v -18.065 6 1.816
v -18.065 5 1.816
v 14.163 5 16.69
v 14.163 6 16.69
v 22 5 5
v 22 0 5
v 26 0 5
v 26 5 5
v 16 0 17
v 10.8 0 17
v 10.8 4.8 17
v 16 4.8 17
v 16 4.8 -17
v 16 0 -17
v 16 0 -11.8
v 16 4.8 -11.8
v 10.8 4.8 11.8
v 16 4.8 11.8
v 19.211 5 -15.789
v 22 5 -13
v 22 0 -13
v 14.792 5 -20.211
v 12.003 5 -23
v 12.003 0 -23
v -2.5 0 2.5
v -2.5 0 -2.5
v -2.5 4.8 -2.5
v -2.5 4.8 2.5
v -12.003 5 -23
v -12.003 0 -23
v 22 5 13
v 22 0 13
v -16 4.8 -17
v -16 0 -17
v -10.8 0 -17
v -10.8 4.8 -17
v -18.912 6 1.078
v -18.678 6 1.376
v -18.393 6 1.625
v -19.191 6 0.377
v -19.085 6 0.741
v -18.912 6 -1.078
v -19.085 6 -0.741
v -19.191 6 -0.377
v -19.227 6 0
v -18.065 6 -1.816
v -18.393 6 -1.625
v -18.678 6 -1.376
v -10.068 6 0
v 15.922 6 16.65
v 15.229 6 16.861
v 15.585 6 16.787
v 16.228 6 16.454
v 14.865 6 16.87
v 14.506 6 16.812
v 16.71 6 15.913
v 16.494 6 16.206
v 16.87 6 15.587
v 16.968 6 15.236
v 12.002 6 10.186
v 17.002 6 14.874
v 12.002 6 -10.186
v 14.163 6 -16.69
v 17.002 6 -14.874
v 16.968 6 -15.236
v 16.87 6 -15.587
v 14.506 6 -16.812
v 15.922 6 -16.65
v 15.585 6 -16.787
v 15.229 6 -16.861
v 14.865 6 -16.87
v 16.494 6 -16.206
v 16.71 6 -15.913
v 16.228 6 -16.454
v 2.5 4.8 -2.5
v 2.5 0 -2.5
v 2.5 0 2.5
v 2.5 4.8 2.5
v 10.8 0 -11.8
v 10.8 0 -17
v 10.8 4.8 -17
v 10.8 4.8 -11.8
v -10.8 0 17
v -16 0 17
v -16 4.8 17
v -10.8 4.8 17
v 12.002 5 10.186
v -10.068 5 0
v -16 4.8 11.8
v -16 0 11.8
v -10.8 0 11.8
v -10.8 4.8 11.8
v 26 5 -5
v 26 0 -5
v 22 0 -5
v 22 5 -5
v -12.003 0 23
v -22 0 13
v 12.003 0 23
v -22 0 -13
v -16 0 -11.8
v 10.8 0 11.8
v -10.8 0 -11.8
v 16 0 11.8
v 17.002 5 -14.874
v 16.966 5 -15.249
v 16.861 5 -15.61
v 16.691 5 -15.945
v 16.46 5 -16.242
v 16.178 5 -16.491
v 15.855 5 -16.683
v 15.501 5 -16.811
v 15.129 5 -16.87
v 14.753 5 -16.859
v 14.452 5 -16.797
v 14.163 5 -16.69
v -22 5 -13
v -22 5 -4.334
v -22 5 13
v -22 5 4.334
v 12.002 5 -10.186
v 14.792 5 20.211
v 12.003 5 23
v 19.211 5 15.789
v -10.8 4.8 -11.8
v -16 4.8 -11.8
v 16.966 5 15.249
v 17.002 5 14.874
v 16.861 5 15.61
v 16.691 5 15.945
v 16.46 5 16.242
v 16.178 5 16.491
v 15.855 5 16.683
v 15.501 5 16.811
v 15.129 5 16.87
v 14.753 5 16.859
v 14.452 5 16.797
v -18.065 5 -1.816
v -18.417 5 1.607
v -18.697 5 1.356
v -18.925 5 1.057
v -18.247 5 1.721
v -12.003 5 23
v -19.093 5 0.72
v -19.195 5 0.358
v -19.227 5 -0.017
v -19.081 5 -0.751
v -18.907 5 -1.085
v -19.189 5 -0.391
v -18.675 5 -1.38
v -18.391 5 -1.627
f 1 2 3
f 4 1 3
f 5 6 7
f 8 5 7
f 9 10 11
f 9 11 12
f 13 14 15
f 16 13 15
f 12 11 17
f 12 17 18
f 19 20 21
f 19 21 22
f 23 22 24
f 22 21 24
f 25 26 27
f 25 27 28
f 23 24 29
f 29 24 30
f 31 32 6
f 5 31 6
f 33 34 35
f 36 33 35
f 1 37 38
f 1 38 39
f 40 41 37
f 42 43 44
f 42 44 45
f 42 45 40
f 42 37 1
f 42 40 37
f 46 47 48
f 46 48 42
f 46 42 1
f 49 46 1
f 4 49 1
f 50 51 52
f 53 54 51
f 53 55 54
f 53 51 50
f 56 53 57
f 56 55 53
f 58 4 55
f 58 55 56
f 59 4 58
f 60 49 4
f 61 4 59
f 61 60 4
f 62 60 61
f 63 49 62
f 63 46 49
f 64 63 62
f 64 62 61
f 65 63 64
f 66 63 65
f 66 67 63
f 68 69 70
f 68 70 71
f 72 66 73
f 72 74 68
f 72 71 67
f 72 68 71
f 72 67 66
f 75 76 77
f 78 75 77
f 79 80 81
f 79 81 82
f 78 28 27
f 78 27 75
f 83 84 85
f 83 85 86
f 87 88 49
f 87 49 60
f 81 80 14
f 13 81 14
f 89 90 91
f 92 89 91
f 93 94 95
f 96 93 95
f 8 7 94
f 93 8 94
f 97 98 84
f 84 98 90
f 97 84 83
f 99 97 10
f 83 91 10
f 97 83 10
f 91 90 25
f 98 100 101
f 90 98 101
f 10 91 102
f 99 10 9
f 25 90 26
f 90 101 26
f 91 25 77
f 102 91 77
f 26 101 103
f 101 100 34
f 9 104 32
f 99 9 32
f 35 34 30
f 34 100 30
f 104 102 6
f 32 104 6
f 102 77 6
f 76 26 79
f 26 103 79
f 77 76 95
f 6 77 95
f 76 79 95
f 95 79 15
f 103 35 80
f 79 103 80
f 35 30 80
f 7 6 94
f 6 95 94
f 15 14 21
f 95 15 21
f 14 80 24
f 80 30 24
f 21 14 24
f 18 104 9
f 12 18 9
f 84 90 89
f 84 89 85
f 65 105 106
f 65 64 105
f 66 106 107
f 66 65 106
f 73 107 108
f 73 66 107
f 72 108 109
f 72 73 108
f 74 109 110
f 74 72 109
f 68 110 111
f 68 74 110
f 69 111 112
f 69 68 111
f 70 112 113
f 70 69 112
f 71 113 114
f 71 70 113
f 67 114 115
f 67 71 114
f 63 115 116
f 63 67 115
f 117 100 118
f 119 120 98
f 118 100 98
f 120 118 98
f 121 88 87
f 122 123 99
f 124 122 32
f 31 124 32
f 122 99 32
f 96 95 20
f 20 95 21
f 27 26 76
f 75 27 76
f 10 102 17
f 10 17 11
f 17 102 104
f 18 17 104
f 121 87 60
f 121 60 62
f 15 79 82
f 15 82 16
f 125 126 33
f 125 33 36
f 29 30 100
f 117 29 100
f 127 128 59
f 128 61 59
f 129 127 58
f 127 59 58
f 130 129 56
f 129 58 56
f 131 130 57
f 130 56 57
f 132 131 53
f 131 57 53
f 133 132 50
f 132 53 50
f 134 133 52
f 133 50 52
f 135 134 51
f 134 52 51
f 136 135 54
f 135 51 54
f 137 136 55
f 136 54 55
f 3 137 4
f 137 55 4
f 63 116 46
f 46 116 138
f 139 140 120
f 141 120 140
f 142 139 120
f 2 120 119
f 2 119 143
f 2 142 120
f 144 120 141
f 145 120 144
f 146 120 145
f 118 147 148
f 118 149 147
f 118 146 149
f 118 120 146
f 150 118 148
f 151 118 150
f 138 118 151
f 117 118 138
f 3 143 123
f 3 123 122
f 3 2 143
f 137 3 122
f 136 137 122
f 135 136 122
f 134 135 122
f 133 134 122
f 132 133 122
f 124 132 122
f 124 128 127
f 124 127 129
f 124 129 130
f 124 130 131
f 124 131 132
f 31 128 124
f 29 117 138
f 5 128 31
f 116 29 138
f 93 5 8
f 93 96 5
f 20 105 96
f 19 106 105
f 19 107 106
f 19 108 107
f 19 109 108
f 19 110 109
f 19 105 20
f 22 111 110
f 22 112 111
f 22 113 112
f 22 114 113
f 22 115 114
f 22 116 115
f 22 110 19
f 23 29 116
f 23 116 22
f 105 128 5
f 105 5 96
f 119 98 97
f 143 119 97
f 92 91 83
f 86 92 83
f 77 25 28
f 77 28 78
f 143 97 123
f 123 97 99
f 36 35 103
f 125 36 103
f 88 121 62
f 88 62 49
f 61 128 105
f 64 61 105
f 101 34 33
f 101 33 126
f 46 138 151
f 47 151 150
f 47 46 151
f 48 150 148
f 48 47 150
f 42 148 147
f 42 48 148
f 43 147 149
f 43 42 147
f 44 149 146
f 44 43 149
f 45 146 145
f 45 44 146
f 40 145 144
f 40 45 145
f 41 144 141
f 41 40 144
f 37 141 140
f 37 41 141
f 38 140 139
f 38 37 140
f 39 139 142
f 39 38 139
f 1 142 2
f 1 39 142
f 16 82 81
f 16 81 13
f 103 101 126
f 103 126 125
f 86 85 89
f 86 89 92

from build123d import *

# Parameters (mm, degrees)
BOSS_EXTRU_1_DEPTH      = 5
BOSS_EXTRU_2_DEPTH      = 1
ESQUISSE3_W             = 5.2
ESQUISSE3_H             = 5.2
ESQUISSE3_W_2           = 5
ESQUISSE3_H_2           = 5
ENL_V_MAT_EXTRU_1_DEPTH = 4.8
CONG_4_R                = 2


with BuildPart() as part:
    # Esquisse1 → Boss.-Extru.1 (new body)
    with BuildSketch(Plane(origin=(0, 0, 0), x_dir=(1, 0, 0), z_dir=(0, 1, 0))):
        Polygon((22, 13), (12.003020456, 23), (-12.003020456, 23), (-22, 13), (-22, -13), (-12.003020456, -23), (12.003020456, -23), (22, -13), (22, -5), (26, -5), (26, 5), (22, 5), align=None)
    extrude(amount=BOSS_EXTRU_1_DEPTH)

    # Esquisse2 → Boss.-Extru.2 (add)
    with BuildSketch(Plane(origin=(0, 5, 0), x_dir=(1, 0, 0), z_dir=(0, 1, 0))):
        Polygon((17.001510228, -18), (17.001510228, 18), (-22, 0), align=None)
        Polygon((-10.06810155, 0), (12.001510228, -10.185580242), (12.001510228, 10.185580242), align=None, mode=Mode.SUBTRACT)
    extrude(amount=BOSS_EXTRU_2_DEPTH)

    # Esquisse3 → Enlèv. mat.-Extru.1 (cut)
    with BuildSketch(Plane.XZ):
        with Locations((-13.4, 14.4)):
            Rectangle(ESQUISSE3_W, ESQUISSE3_H)
        with Locations((-13.4, -14.4)):
            Rectangle(ESQUISSE3_W, ESQUISSE3_H)
        with Locations((13.4, -14.4)):
            Rectangle(ESQUISSE3_W, ESQUISSE3_H)
        with Locations((13.4, 14.4)):
            Rectangle(ESQUISSE3_W, ESQUISSE3_H)
        Rectangle(ESQUISSE3_W_2, ESQUISSE3_H_2)
    extrude(amount=-ENL_V_MAT_EXTRU_1_DEPTH, mode=Mode.SUBTRACT)

    # Congé4
    cong_4_edges = [part.edges().sort_by_distance(p)[0] for p in [
        (-22, 5.5, 0),
        (17.001510228, 5.5, 18),
        (17.001510228, 5.5, -18),
    ]]
    fillet(cong_4_edges, radius=CONG_4_R)


solid = part.part
